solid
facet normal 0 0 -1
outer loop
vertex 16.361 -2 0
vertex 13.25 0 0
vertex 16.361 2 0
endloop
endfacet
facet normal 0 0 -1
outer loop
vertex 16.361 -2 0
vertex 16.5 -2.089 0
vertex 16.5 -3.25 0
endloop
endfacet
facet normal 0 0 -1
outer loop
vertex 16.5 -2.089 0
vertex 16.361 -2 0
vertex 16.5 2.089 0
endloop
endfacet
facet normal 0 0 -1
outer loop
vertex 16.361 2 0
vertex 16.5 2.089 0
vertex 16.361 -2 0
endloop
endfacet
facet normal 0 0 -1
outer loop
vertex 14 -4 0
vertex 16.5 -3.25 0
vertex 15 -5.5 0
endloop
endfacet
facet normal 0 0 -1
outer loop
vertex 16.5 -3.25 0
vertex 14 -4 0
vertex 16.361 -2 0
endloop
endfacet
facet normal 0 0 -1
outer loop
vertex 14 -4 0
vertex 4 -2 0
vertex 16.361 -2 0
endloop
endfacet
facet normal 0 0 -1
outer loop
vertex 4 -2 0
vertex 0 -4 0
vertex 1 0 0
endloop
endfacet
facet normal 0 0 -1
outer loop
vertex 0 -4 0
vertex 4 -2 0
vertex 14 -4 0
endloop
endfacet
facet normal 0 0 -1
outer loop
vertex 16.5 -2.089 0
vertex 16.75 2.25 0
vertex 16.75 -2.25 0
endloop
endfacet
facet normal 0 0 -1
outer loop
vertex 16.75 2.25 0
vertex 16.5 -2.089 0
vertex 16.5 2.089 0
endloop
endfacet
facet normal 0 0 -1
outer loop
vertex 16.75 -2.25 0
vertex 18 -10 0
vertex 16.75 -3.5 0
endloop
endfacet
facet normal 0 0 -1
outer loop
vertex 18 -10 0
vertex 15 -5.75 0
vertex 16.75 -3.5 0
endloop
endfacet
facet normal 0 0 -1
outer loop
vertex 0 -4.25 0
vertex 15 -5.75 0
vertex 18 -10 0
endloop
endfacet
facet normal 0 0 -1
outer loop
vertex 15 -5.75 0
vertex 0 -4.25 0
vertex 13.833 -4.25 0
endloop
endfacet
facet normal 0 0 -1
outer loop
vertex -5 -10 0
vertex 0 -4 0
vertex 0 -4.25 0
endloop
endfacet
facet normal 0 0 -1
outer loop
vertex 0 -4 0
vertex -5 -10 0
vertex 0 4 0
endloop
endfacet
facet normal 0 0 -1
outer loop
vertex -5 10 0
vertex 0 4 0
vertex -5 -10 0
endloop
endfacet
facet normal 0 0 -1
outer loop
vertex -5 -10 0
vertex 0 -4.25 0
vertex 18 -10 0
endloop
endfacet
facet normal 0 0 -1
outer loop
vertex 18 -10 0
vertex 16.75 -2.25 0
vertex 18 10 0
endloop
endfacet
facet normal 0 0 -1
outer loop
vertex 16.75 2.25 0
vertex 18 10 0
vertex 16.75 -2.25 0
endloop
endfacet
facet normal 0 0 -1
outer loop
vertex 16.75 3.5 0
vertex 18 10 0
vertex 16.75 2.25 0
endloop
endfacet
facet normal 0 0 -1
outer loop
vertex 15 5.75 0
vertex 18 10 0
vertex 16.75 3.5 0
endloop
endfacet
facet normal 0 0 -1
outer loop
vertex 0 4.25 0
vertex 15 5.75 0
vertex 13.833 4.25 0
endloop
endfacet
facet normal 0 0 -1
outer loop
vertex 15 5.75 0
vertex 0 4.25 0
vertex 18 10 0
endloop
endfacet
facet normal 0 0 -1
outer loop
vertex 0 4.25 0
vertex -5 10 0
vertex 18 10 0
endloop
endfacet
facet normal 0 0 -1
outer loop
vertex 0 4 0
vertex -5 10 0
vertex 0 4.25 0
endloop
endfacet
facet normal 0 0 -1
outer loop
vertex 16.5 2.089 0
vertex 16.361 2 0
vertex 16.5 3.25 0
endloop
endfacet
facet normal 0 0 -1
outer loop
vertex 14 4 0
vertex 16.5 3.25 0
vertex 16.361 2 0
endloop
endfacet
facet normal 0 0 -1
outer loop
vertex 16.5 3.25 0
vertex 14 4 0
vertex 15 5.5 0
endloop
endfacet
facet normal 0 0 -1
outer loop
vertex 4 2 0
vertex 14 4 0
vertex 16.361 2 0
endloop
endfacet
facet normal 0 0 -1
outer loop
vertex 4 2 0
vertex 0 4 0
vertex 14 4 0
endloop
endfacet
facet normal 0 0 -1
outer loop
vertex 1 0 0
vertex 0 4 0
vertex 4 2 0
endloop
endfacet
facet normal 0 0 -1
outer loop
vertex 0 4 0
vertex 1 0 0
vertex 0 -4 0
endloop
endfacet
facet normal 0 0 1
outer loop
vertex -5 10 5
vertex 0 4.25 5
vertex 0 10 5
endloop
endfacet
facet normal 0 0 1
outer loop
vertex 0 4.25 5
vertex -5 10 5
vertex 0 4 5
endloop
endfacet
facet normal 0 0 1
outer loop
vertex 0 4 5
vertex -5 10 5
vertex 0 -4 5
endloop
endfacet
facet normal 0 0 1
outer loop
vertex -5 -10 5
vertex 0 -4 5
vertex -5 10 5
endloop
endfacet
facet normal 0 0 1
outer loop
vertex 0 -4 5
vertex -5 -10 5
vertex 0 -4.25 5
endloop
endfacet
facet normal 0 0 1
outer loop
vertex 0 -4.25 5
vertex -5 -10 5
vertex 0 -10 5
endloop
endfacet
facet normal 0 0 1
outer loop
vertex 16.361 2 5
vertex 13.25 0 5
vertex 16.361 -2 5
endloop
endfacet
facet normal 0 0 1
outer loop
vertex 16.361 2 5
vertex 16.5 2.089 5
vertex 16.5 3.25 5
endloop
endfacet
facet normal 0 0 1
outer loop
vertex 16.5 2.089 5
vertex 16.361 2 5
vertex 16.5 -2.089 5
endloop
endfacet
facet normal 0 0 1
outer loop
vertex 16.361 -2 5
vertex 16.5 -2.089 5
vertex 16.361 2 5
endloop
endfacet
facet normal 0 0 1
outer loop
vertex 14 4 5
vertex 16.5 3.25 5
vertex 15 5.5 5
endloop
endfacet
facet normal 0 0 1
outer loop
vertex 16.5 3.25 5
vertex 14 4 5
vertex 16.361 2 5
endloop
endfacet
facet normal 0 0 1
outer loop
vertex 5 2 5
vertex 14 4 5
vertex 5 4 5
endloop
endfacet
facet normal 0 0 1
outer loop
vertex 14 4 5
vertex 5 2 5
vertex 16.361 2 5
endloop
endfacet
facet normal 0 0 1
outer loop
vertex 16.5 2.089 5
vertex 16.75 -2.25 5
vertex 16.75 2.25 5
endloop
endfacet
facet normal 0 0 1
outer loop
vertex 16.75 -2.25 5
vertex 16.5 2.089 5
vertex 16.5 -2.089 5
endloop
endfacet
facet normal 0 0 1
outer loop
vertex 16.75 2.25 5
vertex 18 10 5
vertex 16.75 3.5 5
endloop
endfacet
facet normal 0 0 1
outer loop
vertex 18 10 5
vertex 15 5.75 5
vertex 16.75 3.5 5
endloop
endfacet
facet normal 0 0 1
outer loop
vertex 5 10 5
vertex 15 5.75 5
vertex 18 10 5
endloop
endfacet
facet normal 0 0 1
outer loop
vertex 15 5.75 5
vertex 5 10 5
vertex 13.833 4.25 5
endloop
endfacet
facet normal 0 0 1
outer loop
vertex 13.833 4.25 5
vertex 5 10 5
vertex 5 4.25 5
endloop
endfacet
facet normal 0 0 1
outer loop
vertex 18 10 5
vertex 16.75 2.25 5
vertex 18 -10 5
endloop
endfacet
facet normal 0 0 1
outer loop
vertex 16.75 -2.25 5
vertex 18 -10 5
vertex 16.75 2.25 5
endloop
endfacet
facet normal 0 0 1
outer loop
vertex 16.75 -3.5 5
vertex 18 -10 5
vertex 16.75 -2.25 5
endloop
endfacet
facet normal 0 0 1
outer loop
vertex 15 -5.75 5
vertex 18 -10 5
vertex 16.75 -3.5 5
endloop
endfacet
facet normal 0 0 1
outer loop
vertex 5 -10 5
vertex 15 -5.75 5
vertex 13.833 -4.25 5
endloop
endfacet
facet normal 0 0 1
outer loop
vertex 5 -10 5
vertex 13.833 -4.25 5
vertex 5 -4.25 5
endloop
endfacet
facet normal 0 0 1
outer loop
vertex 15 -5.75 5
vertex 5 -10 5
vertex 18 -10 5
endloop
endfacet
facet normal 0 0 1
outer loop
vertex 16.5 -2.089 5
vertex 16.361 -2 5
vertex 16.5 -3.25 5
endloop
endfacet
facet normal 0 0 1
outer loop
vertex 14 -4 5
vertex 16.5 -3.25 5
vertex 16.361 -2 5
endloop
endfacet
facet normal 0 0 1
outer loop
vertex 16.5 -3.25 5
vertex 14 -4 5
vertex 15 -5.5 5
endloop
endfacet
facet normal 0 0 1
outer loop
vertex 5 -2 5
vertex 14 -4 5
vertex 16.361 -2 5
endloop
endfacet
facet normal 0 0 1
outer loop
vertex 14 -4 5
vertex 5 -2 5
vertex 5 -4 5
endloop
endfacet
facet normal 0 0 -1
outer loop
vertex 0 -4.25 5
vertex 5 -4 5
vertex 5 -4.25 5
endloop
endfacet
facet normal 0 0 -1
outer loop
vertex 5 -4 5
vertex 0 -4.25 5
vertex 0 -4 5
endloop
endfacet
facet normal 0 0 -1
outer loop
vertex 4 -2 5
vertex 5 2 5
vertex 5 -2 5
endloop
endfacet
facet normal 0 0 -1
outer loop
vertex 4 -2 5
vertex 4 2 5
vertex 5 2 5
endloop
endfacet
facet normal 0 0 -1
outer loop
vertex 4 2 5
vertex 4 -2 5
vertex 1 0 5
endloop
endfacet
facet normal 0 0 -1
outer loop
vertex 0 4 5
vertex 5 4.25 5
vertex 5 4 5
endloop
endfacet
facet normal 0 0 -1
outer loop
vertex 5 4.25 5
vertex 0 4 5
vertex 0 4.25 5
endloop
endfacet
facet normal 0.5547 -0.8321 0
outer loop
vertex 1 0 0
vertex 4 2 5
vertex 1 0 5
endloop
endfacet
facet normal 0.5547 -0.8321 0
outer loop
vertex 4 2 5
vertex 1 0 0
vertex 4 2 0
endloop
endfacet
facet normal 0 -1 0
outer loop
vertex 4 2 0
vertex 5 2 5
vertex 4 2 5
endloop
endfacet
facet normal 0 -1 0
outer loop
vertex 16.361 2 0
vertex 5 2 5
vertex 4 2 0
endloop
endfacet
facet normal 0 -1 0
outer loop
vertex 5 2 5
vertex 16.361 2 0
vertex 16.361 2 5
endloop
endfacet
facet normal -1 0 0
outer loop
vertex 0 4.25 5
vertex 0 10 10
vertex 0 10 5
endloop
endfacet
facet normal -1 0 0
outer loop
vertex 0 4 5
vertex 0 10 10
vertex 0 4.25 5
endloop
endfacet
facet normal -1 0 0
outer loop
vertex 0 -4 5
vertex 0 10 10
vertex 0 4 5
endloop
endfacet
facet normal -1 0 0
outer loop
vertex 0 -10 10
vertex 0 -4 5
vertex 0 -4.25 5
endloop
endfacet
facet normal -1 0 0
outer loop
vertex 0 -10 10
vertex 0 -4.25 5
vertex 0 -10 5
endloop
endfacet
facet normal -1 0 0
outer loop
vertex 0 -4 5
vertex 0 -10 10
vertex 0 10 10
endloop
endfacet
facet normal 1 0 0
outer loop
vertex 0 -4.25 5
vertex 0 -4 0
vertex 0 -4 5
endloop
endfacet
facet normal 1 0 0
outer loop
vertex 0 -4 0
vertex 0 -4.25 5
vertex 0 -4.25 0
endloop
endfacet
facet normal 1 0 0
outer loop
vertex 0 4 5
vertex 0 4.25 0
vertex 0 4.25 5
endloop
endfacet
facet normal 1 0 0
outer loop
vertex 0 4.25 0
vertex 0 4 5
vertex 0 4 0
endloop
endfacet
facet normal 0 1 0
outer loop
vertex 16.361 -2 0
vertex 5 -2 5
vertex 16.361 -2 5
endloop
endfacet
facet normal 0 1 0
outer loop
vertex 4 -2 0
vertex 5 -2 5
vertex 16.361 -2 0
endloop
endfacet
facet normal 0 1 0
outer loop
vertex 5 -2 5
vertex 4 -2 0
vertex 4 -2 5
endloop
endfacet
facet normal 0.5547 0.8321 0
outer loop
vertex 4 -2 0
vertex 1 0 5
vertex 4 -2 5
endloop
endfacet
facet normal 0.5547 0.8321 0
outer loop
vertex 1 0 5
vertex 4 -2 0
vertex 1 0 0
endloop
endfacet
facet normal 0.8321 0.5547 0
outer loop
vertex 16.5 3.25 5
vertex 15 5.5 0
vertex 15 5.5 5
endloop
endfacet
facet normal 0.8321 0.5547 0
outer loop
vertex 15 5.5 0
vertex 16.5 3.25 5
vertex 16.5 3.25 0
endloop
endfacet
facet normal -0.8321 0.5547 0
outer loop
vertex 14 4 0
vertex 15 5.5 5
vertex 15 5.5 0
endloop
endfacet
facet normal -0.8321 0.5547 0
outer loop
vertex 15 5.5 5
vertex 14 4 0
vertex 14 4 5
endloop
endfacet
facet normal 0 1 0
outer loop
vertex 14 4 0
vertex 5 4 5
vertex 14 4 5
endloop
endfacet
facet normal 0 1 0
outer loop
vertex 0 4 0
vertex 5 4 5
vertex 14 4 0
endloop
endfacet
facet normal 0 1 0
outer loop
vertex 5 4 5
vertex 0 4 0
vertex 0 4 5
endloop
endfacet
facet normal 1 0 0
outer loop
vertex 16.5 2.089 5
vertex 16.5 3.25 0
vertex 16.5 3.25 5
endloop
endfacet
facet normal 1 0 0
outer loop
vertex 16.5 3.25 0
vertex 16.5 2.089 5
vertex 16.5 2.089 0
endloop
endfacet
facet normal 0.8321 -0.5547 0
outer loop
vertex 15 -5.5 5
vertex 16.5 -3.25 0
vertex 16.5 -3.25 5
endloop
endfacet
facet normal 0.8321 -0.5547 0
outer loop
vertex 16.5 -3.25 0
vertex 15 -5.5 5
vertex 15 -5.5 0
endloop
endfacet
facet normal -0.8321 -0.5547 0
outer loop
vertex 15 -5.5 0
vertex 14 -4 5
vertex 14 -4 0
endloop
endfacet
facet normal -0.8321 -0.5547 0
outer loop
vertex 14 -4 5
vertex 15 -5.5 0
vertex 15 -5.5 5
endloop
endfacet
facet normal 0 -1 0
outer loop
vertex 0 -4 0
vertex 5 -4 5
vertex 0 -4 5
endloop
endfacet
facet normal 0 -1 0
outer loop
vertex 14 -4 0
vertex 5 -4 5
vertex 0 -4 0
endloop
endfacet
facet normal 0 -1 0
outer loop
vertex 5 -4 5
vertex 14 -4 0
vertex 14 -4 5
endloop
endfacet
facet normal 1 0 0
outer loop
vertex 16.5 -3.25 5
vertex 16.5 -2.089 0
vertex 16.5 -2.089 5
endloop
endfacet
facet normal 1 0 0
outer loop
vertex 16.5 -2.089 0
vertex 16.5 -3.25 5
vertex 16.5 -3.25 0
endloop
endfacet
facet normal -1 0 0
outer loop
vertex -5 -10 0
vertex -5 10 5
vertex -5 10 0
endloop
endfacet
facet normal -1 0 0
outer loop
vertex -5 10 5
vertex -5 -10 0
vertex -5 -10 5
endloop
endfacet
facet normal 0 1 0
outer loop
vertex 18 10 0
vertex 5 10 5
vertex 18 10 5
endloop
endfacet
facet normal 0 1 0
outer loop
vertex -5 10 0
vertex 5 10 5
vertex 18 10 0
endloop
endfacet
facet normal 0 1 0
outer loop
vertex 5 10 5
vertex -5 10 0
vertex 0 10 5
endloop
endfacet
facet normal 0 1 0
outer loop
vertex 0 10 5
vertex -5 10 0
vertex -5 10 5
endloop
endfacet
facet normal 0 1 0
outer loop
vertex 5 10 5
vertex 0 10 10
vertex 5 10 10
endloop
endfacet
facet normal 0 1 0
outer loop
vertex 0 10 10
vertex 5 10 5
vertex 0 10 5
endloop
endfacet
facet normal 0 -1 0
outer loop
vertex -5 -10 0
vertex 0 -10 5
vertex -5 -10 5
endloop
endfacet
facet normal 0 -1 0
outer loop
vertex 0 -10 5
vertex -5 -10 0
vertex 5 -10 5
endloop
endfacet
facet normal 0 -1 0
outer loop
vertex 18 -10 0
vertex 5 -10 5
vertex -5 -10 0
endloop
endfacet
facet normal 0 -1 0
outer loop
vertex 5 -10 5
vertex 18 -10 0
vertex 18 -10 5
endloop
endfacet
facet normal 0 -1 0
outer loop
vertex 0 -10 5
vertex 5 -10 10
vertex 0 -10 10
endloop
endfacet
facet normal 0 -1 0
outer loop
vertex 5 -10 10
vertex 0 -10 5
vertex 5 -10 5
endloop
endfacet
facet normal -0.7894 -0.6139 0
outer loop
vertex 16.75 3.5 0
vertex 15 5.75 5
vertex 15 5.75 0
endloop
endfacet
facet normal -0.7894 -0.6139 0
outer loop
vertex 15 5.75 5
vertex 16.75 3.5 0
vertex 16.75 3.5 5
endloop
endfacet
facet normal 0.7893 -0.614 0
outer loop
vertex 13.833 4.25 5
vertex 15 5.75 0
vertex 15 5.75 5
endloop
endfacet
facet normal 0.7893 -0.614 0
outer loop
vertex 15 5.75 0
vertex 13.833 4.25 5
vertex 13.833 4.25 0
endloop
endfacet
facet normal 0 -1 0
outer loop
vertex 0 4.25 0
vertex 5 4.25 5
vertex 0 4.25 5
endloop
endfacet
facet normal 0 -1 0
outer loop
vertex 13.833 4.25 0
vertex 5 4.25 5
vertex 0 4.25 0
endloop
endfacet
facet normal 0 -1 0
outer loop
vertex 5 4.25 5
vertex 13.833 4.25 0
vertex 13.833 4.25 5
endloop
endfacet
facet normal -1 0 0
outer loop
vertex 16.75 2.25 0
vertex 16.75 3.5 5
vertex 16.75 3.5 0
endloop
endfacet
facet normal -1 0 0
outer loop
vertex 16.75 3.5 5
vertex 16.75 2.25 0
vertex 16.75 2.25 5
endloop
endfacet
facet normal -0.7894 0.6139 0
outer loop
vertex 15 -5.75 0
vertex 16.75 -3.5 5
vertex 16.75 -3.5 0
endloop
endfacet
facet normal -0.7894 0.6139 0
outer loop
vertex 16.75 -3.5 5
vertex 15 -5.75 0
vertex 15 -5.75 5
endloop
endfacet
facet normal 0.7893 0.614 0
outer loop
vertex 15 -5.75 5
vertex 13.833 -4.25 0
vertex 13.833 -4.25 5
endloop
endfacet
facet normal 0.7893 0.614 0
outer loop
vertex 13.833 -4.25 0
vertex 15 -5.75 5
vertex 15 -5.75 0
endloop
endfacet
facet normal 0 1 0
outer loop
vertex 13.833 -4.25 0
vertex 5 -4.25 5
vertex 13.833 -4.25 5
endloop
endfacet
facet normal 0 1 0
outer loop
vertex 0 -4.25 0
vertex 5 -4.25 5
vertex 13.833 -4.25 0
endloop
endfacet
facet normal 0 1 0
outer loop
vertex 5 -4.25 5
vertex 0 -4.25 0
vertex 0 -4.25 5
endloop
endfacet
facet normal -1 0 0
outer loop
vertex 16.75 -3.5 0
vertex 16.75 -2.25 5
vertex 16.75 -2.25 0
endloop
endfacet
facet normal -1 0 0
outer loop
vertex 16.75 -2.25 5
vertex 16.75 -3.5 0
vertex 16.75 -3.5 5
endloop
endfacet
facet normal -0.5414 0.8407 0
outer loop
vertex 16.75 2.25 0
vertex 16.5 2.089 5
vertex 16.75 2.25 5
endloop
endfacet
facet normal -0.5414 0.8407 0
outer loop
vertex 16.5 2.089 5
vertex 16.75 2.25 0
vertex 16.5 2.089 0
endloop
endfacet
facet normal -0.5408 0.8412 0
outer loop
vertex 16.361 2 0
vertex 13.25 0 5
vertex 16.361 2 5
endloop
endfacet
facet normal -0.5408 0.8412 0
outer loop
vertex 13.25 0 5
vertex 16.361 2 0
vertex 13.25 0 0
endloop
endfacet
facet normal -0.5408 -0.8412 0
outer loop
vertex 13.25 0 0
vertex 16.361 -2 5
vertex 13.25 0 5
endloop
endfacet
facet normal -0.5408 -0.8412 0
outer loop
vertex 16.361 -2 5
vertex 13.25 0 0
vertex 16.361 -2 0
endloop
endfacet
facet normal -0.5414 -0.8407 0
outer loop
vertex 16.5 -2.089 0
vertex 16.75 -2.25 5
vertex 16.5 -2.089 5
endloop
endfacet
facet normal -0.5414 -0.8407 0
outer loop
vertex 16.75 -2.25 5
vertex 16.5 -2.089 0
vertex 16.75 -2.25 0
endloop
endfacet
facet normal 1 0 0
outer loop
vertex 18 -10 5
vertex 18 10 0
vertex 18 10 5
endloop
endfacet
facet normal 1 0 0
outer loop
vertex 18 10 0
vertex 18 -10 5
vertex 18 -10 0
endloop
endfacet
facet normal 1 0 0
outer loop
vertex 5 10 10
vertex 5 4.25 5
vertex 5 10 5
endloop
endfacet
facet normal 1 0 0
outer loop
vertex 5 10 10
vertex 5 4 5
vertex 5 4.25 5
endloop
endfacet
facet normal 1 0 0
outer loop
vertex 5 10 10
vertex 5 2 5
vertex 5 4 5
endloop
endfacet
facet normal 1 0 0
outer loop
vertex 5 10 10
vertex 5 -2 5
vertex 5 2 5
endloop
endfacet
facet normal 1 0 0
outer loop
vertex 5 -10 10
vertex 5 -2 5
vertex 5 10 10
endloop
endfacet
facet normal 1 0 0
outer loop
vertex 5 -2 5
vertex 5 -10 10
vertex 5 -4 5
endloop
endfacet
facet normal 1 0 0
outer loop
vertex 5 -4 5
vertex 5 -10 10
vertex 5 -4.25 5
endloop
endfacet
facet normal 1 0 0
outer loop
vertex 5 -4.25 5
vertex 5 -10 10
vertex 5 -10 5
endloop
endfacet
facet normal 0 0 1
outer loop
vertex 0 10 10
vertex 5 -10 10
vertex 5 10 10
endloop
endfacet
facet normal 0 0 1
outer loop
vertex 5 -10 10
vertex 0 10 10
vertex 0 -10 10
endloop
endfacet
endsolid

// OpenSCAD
//Test Clip Hinges that can be 3D printed

//Strength
//Too much and it breaks
//Too little and it doesn't clip
//Strength increases with cross section of the beam
//	Dz *Ty
//Strength decreases with length of the beam
//	LGx
//Strength increases with size of the grip
//	Gy


//Test 1
//Dz=5, Ty=2, LGx=50, Gy=2, Dy=6
//Fitting is good, it could be a little tighter on the head
//The ratio Gy/Gx grip needs to be steeper to make good contact
//It's very weak
//Strenght = Dz*Ty/LGx = 0.2mm
//Gy=2mm Strength = 0.4 mm2

//Test 2
//Increase Strength
//Steeper grip
//Dz=5, Ty=2, LGx=20, Gy=1, Dy=6
//Strength = Gy *Dz*Ty/LGx = 1 *5*2 /20 = 0.5 mm2
//Feedback
//still too weak, the grip is too little, gap is too wide

//Test 3
//Increase strength, increase grip, reduce gap, make full sleeve
//Dz=5, Ty=2, LGx=15, Gy=1.5, Dy=4
//Strength = Gy *Dz*Ty/LGx = 1.5 *5*2 /15 = 1.0 mm2

//TEST4
//Double sided 

Dz=3;
Ty=1.5;
LGx=10;
Gy=1.0;
Dy=3;


module cube_translate(size_vector, translate_vector)
{
    translate(translate_vector)
    cube(size_vector);
}


module long_hinge(in_height, in_length, in_thickness, in_grip, in_reinforce )
{
	linear_extrude(in_height)
	polygon
	(
		points=
		[
			[0.0,0.0],
			[in_thickness,0],
			[in_thickness,in_length+in_grip+in_reinforce],
			[in_thickness/2,in_length+in_grip+in_reinforce],
			[-in_grip,in_length+in_reinforce],
			[-in_grip,in_length],
			[0,in_length],

		],
		paths=
		[
			[0,1,2,3,4,5,6]
		],
		convexity=1
	);	
}


module hinge_triangle_up( Dz, Ty, LGx, Gx, Gy )
{
	//Gx hieght of the grip cannot exceed 2*Ty thickness
	//Dz = Z height of the hinge
	//Ty = Thickness of the hinge
	
	//HARDNESS OF THE HINGE
	//Hardness increases with the surface Dz*Ty
	//Hardness decreases with Length LGx
	linear_extrude(Dz)
	polygon
	(
		points=
		[
			//Bottom Left
			[0.0,0.0],
			//Thickenss of the hinge
			[0.0, Ty],
			//Start of the triangular bump
			[LGx -Gx, Ty],
			//Tip of the bump
			[LGx, Ty+Gy],
			//Tip of the hinge
			[LGx+1.5*Gx, Ty -0.5*Gy],
			//Tip base of the hinge
			[LGx+1.5*Gx, 0],
		],
		paths=
		[
			[0,1,2,3,4,5]
		],
		convexity=1
	);	
}

module hinge_triangle_down( Dz, Ty, LGx, Gx, Gy )
{
	//Flip and keep origin to the base of the long side
	translate([0,0,Dz])
	rotate([0,180,-180])
	hinge_triangle_up(Dz, Ty, LGx, Gx, Gy);
}

module hinge_male(Dz, Ty, LGx, Gy, Dy )
{
	//
	Gx = Dy/4;

	linear_extrude(Dz)
	polygon
	(
		points=
		[
			[0.0, -Dy/2],
			[0.0, Dy/2],
			[Dy, Dy/2],
			[Dy/4, 0],
			[Dy, -Dy/2],

		],
		paths=
		[
			[0,1,2,3,4]
		],
		convexity=1
	);	

	translate([0,Dy/2,0])
	hinge_triangle_up(Dz, Ty, LGx, Gx, Gy);

	translate([0,-Dy/2,0])
	hinge_triangle_down(Dz, Ty, LGx, Gx, Gy);
}

module hinge_female(Dz, Ty, LGx, Gy, Dy )
{
	//Male hinges with additional slack
	y_slack = 0.5;
	//
	Gx = Dy/4+y_slack/3;
	//Conserve the tips
	translate([0,Dy/2+y_slack/2,0])
	hinge_triangle_up(Dz, Ty, LGx, Gx, Gy);
	translate([0,-Dy/2-y_slack/2,0])
	hinge_triangle_down(Dz, Ty, LGx, Gx, Gy);
	//Add a box to cut out the space between hinges
	//translate([0,-Dy/2-y_slack/2,0])
	//cube([LGx+1.5*Gx,Dy+y_slack,Dz]);
	//Subtract a ribbon that leaves a triangle at the end
	linear_extrude(Dz)
	polygon
	(
		points=
		[
			[0.0, -Dy/2-y_slack/2],
			[0.0, Dy/2+y_slack/2],
			[LGx +1.5*Gx, Dy/2+y_slack/2],
			[LGx -1.5*Gx, 0.0],
			[LGx +1.5*Gx, -Dy/2-y_slack/2],
		],
		paths=
		[
			[0,1,2,3,4]
		],
		convexity=1
	);	
}

//cube_translate([1, 2, 3], [4, 5, 6]);

//long_hinge(10, 100, 5, 3, 1 );

//hinge_triangle_up( 10, 3, 50, 2, 6 );
//hinge_triangle_down( 10, 3, 50, 2, 6 );

module test_hinge_male()
{
	cube_translate([5,20,5],[-5,-10,0]);
	hinge_male( Dz=5, Ty=2, LGx=15, Gy=1.5, Dy=4 );
}

module test_hinge_female()
{
	LGx = 15;
	cube_translate([5,20,5],[0,-10,5]);

	difference()
	{
		cube_translate([LGx*1.2, 20, 5],[0, -10, 0]);
		hinge_female( Dz=5, Ty=2, LGx=15, Gy=1.5, Dy=4 );
	}
}

test_hinge_male();
test_hinge_female();
